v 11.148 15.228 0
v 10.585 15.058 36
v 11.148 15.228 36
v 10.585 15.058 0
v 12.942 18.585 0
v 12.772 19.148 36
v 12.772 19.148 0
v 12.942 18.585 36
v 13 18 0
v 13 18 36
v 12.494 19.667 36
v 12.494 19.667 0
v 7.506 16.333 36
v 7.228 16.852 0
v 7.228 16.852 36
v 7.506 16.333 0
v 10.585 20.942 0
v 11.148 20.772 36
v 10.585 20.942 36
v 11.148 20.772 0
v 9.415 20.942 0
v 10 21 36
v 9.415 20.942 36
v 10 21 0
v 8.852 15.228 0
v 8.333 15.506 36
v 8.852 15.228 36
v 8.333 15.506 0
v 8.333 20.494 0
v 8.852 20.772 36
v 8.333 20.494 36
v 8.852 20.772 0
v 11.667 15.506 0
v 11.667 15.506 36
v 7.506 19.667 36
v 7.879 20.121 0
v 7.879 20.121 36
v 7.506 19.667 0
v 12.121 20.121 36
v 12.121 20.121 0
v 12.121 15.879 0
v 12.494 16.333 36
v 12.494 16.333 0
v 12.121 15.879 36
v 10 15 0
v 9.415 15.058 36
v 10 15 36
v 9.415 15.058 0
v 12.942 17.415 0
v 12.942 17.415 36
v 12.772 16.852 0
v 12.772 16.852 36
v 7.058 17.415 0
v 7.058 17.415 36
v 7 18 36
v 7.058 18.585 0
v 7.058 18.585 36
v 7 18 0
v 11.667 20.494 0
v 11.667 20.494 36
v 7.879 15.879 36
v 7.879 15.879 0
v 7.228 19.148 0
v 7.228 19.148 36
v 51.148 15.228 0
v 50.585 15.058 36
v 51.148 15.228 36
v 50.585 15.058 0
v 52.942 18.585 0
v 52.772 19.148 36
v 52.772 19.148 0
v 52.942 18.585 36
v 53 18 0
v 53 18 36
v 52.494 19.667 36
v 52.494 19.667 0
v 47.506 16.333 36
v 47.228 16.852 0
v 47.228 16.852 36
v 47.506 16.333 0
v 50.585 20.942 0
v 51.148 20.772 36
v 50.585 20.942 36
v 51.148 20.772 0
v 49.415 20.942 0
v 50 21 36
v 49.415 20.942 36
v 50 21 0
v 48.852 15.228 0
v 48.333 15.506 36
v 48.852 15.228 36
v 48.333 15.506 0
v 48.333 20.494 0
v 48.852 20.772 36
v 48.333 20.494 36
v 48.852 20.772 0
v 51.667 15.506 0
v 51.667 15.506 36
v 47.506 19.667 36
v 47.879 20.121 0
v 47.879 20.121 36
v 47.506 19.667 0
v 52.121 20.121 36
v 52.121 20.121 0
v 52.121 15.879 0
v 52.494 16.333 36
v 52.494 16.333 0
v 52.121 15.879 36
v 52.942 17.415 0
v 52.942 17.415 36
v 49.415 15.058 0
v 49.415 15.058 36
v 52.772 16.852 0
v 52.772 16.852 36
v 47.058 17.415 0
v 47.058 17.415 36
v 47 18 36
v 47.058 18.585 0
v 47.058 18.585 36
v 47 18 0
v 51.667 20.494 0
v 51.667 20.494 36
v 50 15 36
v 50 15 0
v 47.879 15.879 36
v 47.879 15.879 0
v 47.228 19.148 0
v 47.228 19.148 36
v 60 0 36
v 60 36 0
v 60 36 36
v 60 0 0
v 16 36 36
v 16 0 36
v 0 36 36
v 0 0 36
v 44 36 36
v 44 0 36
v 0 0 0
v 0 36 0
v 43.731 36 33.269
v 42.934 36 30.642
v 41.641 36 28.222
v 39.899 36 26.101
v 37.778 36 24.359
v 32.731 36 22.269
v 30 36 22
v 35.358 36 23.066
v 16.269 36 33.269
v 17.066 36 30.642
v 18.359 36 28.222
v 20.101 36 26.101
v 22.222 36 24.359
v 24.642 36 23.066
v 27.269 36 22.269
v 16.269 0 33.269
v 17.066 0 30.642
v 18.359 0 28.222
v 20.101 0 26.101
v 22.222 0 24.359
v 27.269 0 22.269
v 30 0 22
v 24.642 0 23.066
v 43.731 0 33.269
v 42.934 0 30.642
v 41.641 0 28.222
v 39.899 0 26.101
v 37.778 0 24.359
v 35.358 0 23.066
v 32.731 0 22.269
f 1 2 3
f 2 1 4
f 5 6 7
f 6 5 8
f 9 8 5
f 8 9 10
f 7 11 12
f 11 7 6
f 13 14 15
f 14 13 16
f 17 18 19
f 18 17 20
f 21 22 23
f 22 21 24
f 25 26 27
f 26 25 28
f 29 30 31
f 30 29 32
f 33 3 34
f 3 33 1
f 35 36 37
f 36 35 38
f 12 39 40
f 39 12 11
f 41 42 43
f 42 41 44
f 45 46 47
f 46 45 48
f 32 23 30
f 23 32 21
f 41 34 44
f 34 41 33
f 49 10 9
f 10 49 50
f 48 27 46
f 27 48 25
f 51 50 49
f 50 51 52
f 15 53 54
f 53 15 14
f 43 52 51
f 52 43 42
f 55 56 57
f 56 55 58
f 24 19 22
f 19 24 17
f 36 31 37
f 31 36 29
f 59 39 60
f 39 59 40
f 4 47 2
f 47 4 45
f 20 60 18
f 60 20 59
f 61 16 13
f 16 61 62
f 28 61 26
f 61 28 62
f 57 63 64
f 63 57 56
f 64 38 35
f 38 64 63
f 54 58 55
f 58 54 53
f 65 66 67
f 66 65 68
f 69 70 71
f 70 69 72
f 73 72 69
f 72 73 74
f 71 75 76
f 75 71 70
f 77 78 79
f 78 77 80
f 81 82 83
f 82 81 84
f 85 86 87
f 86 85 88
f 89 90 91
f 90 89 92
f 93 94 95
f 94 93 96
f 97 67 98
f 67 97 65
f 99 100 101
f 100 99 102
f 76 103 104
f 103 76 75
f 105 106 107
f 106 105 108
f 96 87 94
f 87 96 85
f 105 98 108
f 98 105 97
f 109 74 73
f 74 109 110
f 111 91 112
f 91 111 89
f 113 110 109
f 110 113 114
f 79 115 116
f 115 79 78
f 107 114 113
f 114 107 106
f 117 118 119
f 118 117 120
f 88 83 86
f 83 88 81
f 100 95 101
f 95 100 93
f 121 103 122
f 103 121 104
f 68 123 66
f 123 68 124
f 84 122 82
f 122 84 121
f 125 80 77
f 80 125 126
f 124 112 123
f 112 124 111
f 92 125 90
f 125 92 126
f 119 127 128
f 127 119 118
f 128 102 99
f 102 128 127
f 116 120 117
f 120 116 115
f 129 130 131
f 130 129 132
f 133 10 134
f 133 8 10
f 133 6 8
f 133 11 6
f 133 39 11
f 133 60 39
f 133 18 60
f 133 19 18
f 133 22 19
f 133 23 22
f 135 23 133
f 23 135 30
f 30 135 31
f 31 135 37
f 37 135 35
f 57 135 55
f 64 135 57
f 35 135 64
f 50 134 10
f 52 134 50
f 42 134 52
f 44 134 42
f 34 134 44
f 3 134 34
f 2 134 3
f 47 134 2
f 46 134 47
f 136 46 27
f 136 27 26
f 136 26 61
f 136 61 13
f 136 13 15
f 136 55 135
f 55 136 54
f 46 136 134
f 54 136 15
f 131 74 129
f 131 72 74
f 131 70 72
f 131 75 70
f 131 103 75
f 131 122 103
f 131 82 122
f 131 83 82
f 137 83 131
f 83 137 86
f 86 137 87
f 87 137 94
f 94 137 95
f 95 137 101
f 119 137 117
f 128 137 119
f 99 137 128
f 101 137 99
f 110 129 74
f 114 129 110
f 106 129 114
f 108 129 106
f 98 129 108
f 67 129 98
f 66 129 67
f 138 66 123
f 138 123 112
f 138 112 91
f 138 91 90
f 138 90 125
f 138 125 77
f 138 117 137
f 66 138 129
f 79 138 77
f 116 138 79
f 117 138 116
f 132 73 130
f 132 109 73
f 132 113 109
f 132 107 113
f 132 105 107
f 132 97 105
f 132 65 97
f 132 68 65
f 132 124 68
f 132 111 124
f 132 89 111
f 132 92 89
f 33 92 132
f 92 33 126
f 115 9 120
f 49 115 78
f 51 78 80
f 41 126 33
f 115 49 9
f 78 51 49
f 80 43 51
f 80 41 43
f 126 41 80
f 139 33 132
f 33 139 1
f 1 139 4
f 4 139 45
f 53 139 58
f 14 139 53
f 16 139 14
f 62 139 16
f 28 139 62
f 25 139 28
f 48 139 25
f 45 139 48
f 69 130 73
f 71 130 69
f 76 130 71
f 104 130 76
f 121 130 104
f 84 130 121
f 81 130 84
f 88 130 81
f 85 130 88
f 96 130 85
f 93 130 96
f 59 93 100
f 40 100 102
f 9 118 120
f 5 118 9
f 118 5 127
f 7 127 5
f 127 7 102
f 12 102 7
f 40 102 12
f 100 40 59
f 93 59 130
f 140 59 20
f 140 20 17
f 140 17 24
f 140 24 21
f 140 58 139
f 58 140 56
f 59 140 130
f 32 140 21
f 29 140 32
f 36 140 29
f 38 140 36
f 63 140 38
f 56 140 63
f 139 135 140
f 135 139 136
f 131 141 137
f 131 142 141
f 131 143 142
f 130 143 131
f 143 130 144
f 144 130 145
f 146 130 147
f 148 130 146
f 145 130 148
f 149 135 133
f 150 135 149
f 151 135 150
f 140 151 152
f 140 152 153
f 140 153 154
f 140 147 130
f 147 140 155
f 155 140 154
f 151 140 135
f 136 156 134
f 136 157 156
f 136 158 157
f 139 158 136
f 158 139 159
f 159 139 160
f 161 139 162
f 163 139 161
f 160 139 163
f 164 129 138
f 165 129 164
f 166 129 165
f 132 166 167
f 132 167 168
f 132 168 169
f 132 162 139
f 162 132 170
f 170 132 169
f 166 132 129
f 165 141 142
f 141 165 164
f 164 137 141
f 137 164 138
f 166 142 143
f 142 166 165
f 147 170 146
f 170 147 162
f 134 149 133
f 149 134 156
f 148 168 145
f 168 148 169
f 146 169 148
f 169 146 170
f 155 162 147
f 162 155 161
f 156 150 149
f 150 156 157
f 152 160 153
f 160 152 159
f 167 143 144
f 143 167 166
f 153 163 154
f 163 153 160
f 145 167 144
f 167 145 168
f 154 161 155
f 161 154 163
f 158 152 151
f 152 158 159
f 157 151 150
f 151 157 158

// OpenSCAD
$fn = 32;

// ----------------------------------------------------------------------
// Saddle clamp: plain shaft clamp
// ----------------------------------------------------------------------

// --- parameters (mm) ---
blk_l = 60;               // block length, X
blk_w = 36;               // block width, Y
blk_h = 36;               // block height
clamp_r = 14;             // shaft groove radius
hole_r = 3;               // bolt hole radius
hole_m = 10;              // bolt hole margin from the ends

saw_depth = clamp_r + 3;  // saw kerf depth

difference() {
  cube([blk_l, blk_w, blk_h]);
  translate([blk_l / 2, -1, blk_h])
    rotate([-90, 0, 0])
      cylinder(h = blk_w + 2, r = clamp_r);
  for (sx = [0, 1])
    translate([sx ? blk_l - hole_m : hole_m, blk_w / 2, -1])
      cylinder(r = hole_r, h = blk_h + 2);
}
